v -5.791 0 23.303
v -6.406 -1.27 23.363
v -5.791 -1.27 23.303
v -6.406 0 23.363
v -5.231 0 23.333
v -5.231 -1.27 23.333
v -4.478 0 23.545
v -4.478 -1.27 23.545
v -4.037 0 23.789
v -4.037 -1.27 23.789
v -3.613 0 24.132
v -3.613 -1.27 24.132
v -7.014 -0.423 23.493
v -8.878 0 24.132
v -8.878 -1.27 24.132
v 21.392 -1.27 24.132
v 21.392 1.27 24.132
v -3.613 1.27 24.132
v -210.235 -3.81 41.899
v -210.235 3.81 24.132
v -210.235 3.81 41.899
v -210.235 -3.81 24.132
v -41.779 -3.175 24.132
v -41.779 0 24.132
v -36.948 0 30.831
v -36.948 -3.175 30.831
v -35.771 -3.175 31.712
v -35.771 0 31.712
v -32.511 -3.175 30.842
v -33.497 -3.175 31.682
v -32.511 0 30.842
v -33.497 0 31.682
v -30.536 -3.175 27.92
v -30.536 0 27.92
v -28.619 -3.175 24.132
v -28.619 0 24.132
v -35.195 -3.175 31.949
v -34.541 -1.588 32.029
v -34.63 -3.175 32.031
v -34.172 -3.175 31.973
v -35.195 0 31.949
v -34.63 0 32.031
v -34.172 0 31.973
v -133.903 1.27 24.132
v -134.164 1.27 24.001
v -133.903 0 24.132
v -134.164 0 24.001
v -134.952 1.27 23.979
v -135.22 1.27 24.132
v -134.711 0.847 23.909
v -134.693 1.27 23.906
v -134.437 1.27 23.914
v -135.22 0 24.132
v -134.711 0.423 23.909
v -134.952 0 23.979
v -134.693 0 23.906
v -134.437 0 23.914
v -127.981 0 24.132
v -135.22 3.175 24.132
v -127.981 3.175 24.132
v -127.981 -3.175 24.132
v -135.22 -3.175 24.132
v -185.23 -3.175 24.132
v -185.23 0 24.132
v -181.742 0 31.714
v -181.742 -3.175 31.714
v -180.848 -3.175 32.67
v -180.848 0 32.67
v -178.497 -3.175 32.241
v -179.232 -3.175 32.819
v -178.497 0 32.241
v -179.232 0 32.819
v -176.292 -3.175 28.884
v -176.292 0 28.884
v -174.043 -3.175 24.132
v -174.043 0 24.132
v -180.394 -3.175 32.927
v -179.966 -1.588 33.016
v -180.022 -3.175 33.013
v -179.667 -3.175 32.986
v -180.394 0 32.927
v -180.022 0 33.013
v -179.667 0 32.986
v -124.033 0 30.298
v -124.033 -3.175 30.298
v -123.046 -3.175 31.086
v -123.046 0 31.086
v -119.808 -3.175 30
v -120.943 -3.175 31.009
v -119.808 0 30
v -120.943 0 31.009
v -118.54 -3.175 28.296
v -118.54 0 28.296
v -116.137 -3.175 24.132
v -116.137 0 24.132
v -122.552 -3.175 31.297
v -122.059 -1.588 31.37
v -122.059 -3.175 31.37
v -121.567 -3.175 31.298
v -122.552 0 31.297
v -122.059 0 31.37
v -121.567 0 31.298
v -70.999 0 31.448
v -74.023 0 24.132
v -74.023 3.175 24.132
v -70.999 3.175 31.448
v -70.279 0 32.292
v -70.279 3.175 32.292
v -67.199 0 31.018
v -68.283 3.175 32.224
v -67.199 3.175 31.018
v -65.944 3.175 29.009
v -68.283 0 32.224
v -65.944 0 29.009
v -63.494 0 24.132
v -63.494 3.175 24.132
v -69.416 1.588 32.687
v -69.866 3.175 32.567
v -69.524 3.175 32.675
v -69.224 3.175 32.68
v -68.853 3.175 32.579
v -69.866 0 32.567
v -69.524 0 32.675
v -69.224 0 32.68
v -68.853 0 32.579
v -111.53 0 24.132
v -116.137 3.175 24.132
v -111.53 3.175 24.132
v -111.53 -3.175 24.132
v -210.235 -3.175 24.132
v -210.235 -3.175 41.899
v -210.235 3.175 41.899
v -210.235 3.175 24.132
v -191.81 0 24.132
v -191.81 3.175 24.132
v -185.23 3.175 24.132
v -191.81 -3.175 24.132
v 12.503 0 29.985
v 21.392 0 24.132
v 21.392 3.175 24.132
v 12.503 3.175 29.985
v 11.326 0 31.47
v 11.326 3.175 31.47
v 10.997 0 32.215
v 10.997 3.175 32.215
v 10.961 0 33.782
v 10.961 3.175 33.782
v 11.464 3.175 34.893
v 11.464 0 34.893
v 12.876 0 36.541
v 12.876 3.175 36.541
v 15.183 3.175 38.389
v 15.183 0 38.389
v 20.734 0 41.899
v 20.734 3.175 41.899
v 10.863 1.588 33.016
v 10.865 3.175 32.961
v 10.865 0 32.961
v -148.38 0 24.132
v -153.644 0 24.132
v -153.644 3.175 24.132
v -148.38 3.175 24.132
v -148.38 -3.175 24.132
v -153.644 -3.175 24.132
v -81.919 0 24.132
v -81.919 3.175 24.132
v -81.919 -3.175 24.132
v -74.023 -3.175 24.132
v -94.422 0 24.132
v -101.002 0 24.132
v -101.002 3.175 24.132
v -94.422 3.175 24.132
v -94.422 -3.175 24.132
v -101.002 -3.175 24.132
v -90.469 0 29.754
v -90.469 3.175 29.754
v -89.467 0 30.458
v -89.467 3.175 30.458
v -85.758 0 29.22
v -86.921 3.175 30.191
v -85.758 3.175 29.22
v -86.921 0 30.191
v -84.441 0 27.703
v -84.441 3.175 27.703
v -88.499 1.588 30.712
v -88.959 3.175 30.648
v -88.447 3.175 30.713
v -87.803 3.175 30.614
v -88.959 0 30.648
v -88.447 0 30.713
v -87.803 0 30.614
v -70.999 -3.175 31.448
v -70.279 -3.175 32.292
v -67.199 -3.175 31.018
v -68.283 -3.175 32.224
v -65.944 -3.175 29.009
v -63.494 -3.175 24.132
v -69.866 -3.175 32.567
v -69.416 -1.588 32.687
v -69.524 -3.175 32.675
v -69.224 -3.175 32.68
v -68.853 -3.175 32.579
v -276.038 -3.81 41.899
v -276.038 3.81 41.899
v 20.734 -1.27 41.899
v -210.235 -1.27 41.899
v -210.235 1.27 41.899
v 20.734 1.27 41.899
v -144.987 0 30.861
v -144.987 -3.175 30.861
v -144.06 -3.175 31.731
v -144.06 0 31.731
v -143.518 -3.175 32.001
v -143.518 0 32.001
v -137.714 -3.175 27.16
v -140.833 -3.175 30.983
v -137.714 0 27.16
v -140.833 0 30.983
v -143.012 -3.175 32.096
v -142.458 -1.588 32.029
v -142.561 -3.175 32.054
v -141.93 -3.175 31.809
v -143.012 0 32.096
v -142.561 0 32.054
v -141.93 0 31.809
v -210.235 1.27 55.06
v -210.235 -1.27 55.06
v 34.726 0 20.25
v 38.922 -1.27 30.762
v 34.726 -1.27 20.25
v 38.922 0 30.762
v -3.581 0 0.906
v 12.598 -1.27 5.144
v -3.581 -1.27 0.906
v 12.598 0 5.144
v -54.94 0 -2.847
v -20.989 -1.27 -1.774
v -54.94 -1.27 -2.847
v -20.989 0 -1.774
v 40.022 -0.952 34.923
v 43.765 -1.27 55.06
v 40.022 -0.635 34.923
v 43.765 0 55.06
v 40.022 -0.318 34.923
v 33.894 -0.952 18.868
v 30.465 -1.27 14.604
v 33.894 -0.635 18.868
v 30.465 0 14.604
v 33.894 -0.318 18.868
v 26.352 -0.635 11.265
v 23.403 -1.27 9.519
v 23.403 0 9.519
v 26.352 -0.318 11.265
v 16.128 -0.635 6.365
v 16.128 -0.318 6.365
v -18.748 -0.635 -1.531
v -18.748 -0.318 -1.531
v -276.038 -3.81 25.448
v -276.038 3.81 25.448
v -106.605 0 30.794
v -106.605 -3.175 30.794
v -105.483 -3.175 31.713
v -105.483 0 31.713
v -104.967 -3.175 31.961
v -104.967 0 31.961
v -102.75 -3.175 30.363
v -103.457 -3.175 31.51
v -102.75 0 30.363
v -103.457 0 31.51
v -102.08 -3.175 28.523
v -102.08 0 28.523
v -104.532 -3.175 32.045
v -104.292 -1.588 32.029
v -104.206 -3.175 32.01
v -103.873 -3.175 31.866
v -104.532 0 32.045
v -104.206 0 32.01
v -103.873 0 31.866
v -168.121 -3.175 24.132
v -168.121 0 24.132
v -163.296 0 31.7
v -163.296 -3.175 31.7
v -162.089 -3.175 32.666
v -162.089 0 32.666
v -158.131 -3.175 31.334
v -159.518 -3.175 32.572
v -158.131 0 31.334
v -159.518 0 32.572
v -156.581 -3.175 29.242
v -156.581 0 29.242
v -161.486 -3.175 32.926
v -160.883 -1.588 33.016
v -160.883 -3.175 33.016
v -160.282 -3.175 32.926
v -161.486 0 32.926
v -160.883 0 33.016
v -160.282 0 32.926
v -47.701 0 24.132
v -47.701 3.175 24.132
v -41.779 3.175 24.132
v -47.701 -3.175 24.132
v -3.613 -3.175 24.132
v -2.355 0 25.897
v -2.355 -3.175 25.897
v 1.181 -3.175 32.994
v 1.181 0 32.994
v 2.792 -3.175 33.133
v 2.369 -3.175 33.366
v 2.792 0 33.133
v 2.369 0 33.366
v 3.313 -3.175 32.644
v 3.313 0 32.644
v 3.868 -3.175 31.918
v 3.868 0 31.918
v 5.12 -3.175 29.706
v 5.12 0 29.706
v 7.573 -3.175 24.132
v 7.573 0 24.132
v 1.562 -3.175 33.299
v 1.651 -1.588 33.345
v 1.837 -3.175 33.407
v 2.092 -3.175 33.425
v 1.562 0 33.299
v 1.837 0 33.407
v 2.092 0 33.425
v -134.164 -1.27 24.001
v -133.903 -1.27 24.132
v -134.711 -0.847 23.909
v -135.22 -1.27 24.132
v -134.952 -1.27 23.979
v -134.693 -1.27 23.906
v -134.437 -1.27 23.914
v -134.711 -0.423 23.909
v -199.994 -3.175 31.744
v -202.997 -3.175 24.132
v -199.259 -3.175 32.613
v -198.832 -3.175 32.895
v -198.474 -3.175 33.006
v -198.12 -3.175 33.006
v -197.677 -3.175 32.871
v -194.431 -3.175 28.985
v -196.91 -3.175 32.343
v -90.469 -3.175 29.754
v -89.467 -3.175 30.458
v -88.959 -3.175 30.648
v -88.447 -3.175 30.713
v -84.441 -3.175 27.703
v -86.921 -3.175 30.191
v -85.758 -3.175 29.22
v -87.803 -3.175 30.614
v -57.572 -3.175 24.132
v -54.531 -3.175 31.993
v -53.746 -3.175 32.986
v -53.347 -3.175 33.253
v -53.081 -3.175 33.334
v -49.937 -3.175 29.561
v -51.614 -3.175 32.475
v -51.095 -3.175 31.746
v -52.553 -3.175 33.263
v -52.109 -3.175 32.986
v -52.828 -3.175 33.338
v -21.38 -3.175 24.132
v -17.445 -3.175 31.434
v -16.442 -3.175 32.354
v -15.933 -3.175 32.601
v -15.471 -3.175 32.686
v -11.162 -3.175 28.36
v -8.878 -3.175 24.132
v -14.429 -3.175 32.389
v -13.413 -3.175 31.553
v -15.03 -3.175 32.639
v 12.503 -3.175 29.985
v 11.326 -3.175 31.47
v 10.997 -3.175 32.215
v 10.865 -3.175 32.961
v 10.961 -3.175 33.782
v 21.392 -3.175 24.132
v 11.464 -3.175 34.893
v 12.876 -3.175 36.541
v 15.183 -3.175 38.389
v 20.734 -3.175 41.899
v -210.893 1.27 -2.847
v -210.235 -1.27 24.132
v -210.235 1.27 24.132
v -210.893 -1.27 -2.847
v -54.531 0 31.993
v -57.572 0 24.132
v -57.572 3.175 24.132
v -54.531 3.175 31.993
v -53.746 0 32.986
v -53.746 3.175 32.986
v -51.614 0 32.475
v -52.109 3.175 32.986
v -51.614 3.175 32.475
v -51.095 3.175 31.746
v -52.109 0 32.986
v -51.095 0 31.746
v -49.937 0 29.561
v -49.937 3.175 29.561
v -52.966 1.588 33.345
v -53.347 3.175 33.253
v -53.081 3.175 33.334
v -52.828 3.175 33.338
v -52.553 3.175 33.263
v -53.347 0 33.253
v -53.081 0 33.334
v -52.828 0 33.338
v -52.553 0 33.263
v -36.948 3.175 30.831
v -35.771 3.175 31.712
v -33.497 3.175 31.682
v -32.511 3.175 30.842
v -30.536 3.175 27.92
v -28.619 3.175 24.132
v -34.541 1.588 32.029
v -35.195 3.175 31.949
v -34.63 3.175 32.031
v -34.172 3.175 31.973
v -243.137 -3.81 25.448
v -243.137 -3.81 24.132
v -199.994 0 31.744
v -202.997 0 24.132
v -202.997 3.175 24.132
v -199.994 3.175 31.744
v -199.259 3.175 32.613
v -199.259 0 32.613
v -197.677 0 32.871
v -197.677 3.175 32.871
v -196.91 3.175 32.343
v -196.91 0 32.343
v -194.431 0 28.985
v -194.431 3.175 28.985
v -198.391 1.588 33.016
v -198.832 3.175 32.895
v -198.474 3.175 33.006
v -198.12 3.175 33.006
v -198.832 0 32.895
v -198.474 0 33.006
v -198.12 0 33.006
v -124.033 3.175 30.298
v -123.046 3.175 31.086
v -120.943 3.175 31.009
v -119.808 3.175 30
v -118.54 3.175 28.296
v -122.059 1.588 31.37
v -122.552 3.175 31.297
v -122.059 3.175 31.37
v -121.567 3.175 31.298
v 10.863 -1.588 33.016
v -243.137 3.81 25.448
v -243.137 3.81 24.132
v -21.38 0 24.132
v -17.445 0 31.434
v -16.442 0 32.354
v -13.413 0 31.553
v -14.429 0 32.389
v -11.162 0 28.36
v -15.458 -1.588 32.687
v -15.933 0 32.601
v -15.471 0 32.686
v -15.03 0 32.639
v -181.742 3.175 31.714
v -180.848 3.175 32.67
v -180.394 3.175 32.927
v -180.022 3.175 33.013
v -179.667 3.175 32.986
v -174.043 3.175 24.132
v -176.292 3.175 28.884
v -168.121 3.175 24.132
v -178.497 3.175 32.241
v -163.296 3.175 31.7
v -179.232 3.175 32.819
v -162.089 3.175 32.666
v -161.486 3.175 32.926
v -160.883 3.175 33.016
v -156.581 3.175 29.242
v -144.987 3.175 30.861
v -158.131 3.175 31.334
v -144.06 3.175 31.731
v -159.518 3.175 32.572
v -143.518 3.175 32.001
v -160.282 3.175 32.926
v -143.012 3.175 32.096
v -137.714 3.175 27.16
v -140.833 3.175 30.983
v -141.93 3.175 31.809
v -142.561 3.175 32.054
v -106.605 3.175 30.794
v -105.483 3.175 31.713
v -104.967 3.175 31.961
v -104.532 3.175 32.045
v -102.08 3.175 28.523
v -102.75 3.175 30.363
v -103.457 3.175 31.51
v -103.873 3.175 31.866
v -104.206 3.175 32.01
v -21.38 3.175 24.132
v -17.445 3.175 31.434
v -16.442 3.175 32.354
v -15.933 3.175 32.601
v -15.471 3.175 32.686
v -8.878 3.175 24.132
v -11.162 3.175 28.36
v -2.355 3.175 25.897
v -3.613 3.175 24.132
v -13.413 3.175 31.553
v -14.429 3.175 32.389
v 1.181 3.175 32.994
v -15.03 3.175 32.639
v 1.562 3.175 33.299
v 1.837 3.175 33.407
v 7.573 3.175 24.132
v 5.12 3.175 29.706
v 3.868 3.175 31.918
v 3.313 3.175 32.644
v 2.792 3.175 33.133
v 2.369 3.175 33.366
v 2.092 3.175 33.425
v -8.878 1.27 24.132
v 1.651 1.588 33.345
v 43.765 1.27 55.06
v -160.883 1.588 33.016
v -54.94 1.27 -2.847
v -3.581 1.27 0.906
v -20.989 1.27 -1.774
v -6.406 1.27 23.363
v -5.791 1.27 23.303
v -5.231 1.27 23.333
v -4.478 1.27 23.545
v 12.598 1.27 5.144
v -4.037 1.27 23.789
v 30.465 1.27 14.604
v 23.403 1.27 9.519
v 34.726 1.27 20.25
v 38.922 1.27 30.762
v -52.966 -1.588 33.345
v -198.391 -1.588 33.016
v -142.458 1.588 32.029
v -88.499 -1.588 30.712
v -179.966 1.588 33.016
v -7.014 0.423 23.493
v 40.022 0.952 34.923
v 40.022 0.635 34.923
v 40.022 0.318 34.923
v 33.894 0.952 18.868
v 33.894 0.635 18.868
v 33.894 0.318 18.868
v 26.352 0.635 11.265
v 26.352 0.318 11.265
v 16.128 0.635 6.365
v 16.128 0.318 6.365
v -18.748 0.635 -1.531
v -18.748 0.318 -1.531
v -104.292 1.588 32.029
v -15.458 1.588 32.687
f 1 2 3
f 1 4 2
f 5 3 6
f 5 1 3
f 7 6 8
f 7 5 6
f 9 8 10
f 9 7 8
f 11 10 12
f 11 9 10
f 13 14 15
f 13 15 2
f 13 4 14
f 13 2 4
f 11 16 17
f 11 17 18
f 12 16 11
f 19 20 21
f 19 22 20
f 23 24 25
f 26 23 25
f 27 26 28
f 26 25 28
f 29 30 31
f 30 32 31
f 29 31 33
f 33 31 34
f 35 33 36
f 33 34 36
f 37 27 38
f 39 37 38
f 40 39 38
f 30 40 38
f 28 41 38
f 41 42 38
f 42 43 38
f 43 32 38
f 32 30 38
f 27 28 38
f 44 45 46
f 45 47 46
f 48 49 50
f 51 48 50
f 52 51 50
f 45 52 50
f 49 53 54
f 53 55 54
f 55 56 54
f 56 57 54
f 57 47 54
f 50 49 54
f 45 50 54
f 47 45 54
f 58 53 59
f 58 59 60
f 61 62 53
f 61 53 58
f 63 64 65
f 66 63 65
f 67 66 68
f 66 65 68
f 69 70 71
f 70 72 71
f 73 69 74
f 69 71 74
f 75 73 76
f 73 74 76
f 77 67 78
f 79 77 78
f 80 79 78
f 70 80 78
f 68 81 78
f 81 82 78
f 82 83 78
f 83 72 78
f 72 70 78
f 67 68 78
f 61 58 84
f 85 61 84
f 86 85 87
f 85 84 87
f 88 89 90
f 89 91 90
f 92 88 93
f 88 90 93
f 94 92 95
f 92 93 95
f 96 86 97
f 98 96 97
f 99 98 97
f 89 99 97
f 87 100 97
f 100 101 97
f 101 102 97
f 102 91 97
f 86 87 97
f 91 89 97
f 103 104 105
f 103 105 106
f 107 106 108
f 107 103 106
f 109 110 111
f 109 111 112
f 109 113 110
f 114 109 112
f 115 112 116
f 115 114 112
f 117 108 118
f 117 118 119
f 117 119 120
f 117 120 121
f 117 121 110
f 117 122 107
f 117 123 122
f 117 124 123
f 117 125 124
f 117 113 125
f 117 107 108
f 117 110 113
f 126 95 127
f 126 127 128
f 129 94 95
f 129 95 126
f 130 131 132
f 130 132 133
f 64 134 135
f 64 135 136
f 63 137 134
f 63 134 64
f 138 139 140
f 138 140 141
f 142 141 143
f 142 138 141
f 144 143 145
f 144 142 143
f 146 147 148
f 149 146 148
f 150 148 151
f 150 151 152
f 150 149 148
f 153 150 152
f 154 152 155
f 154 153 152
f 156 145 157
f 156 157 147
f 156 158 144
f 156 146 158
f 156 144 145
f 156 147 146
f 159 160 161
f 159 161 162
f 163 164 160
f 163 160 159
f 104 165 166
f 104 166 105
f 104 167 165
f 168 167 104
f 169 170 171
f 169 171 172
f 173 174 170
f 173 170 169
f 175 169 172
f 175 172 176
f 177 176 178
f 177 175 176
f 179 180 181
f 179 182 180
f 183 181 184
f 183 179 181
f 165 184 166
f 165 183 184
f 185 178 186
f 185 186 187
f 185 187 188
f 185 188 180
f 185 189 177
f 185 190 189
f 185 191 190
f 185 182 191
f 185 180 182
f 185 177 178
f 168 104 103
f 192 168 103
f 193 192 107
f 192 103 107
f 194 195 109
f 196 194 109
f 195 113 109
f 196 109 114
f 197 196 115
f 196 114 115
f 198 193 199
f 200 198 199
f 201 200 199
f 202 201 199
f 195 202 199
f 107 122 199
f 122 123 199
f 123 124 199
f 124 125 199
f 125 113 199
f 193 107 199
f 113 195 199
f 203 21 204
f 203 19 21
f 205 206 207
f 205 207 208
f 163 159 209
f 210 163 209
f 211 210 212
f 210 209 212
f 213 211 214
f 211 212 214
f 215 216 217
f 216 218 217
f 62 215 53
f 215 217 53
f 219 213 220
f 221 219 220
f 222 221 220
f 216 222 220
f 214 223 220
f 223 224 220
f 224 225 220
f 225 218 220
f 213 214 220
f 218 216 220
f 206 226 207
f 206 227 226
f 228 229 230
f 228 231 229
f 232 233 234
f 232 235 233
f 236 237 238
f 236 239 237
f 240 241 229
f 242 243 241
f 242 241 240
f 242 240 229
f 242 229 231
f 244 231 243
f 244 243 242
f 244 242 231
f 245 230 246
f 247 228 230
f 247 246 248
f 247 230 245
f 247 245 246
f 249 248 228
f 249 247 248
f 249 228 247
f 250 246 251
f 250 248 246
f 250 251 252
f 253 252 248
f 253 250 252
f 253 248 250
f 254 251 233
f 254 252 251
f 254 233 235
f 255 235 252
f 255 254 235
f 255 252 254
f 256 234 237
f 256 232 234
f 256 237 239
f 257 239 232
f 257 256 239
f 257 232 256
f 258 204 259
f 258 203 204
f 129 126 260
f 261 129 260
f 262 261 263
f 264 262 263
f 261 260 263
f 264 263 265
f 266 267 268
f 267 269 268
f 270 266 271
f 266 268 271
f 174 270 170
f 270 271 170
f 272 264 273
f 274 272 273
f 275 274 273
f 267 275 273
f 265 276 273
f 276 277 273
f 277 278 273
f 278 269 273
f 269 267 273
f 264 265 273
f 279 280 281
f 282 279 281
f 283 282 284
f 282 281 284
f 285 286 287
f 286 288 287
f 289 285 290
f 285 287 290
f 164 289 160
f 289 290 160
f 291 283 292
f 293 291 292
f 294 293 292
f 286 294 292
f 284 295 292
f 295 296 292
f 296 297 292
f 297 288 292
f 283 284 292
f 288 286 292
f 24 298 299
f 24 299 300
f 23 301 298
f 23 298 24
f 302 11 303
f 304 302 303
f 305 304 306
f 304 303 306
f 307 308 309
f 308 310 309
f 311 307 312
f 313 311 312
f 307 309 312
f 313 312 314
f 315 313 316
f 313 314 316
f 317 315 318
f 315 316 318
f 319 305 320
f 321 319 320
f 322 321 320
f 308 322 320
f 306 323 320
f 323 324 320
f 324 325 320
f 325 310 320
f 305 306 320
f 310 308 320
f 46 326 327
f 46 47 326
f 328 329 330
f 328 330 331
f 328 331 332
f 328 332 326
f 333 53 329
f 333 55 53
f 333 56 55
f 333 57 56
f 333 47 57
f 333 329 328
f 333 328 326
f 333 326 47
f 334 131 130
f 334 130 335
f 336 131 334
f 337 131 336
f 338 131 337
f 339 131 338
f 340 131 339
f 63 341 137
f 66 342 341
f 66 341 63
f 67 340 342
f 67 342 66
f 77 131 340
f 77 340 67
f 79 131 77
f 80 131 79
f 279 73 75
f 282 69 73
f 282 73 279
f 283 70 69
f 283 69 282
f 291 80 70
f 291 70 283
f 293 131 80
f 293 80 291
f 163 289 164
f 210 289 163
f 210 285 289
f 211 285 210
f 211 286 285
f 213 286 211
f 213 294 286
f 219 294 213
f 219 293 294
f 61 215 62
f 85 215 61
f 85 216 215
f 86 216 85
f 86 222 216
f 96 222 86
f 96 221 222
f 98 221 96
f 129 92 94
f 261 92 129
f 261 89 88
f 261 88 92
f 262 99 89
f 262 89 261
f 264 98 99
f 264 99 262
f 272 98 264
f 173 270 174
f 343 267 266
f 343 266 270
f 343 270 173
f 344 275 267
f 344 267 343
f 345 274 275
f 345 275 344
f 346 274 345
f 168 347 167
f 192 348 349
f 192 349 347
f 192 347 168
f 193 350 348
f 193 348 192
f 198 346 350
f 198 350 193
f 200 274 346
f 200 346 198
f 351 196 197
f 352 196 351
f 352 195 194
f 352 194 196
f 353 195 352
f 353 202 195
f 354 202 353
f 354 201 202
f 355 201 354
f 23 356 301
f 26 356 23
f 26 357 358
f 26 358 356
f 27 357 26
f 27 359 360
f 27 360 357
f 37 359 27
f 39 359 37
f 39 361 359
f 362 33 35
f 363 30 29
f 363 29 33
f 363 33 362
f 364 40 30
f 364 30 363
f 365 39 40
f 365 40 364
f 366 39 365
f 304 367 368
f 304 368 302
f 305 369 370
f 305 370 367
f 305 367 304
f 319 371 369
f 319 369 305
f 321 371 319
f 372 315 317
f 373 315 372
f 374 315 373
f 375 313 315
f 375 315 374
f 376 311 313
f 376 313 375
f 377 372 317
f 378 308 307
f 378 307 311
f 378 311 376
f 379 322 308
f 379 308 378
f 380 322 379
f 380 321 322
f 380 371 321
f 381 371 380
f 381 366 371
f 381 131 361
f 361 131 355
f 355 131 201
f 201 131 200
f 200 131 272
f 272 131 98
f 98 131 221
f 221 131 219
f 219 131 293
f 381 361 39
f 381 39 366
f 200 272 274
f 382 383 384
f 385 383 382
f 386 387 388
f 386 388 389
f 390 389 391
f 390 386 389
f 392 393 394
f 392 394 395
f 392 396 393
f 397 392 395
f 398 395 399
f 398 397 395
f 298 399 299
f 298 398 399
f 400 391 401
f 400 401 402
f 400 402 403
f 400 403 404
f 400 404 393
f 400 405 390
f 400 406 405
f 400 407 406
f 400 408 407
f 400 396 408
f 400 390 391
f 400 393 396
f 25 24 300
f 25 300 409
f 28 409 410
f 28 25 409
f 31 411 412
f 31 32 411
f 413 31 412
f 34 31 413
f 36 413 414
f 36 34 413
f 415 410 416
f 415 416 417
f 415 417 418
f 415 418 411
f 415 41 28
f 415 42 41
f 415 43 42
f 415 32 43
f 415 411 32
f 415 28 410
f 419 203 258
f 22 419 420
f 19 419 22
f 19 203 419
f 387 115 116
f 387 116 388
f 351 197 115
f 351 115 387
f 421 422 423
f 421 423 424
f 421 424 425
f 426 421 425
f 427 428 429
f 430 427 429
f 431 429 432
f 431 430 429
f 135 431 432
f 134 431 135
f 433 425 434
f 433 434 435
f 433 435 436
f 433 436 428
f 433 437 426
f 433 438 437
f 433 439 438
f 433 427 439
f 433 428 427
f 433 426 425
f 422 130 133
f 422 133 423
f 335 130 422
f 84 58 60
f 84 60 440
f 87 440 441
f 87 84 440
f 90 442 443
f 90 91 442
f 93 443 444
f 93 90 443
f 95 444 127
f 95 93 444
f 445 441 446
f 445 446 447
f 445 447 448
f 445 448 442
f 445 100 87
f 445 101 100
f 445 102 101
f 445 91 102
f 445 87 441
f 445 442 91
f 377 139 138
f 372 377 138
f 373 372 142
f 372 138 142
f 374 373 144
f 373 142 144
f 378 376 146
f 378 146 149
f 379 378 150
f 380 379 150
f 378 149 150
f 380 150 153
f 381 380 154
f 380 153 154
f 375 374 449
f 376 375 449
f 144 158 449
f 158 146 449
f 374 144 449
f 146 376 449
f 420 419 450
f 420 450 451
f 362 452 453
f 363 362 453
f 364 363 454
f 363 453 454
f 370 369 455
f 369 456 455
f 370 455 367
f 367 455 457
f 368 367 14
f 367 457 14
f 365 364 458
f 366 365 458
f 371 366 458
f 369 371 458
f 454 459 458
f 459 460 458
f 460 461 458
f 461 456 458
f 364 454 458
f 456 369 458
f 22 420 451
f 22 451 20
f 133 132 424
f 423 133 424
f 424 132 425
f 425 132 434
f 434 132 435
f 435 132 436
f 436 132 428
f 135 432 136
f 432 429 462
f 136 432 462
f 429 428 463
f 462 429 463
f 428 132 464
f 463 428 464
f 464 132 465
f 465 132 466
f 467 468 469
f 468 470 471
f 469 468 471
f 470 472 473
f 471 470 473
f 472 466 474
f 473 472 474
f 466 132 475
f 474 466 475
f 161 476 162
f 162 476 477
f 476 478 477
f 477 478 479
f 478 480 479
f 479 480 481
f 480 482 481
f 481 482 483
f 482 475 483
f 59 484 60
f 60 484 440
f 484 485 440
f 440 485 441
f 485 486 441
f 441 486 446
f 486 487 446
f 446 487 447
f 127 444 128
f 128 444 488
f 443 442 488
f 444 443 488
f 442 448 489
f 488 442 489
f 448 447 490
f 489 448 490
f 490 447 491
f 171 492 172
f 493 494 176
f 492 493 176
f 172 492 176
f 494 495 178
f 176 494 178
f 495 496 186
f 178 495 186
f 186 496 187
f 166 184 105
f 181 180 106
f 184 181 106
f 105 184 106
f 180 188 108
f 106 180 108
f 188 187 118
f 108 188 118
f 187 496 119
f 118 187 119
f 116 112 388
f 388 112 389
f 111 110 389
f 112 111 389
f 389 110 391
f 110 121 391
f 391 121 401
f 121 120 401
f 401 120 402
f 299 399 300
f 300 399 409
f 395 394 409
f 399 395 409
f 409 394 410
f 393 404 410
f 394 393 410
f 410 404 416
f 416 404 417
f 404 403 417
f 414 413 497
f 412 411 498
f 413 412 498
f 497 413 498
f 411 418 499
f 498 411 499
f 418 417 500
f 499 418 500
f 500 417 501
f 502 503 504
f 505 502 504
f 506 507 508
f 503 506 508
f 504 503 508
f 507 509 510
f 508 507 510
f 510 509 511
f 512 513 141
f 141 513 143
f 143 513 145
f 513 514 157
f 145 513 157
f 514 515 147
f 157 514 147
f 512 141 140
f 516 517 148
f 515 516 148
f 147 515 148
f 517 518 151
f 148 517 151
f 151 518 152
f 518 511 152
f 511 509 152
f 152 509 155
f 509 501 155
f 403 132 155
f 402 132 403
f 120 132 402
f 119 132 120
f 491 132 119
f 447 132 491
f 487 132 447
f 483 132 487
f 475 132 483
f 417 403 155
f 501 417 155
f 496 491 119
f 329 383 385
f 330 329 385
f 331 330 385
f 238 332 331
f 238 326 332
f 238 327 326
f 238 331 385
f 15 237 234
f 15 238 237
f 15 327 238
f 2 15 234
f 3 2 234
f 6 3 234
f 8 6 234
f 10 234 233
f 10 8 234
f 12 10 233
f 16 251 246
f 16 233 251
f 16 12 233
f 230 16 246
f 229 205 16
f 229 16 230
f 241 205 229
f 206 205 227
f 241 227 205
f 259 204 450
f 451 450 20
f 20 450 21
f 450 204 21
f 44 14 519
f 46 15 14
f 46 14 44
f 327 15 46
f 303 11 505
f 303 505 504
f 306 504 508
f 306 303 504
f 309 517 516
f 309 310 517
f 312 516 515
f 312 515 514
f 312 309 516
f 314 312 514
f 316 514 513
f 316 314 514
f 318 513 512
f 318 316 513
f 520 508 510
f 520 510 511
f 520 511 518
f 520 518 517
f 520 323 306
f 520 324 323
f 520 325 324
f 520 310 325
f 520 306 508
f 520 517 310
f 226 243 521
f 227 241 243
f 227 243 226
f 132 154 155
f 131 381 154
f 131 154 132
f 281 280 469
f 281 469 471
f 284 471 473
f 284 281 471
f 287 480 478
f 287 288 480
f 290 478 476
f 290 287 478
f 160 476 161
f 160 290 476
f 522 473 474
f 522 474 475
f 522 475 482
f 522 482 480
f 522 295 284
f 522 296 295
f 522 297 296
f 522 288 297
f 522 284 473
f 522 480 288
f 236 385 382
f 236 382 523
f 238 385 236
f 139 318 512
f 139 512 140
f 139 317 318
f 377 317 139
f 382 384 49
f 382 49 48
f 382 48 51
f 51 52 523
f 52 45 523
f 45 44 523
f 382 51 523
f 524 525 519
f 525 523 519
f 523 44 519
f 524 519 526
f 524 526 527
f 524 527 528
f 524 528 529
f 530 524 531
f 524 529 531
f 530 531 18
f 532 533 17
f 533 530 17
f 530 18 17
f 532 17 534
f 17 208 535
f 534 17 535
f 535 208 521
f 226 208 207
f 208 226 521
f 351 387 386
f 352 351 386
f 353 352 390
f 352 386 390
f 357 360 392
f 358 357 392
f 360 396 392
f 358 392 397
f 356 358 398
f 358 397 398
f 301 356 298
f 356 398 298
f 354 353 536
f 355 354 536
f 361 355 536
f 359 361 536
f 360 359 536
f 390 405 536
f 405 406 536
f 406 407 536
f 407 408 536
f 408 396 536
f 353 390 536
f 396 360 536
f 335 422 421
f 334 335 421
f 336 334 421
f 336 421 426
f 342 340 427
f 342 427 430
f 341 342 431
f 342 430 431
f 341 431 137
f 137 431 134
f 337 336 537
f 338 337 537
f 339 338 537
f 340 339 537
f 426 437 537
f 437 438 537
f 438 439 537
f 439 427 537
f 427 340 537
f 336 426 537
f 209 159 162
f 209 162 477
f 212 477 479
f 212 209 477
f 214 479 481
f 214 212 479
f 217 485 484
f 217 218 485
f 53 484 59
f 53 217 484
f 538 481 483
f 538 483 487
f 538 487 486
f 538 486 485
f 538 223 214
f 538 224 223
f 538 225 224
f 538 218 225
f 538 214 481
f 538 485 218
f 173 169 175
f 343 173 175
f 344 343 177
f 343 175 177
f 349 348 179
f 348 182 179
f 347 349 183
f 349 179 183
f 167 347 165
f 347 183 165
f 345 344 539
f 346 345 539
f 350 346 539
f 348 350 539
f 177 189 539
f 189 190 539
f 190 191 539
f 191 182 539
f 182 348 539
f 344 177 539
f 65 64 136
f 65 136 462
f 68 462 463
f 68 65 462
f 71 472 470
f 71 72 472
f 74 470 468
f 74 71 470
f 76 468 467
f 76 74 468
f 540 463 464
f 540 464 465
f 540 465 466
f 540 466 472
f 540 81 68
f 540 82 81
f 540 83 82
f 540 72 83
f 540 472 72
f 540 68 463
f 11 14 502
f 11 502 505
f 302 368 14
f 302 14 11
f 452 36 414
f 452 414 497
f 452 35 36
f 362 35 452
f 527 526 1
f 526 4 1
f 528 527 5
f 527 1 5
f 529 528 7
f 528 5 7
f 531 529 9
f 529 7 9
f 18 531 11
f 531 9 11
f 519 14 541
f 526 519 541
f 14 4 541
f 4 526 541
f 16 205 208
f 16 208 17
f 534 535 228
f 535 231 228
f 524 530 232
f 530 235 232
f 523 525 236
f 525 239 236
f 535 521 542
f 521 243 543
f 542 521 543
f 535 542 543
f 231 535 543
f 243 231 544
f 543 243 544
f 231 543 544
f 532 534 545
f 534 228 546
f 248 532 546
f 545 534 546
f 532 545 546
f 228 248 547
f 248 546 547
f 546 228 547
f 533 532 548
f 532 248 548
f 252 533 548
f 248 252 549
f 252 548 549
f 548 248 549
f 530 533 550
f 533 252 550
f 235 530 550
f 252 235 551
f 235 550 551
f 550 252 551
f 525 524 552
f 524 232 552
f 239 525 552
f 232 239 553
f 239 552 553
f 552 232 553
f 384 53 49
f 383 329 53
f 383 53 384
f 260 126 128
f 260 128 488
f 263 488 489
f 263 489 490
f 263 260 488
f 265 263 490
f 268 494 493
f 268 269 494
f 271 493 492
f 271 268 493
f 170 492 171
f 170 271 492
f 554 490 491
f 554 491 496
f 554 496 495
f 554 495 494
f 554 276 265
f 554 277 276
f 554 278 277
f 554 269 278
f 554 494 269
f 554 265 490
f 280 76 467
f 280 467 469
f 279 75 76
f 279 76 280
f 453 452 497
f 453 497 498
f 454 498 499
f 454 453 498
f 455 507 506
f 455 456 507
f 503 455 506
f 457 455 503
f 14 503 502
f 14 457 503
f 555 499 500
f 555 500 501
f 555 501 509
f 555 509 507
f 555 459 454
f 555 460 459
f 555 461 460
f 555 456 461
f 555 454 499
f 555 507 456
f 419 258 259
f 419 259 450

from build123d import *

# Parameters (mm, degrees)
F1_DEPTH = 1.27
F2_DEPTH = 3.81
F3_DEPTH = 3.175


# Not quite as in the source:
# - the program builds the solid bodies; features that only make, move or delete a surface that nothing else refers to are left out


with BuildPart() as f1:
    # F0 (on Front) → F1 (new body, symmetric)
    with BuildSketch(Plane.XZ):
        with BuildLine():
            Line((-210.2350903421, 55.0596148509), (-210.2350903421, 41.8989928542))
            Line((-210.2350903421, 41.8989928542), (20.7338259748, 41.8989928542))
            Line((20.7338259748, 41.8989928542), (21.3918573496, 24.1321539834))
            Line((21.3918573496, 24.1321539834), (7.5731984796, 24.1321539834))
            Line((7.5731984796, 24.1321539834), (-3.6133266435, 24.1321539834))
            add(Edge.make_bspline(
                [(-8.8775776416, 24.1321539834), (-6.9998897347, 23.4129011572), (-5.1222018278, 22.693648331), (-3.6133266435, 24.1321539834)],
                knots=[0, 0, 0, 0, 0.2589285415, 0.2589285415, 0.2589285415, 0.2589285415], degree=3))
            Line((-8.8775776416, 24.1321539834), (-21.3801710128, 24.1321539834))
            Line((-21.3801710128, 24.1321539834), (-28.6185133859, 24.1321539834))
            Line((-28.6185133859, 24.1321539834), (-41.7791353826, 24.1321539834))
            Line((-41.7791353826, 24.1321539834), (-47.7014150062, 24.1321539834))
            Line((-47.7014150062, 24.1321539834), (-57.5718773798, 24.1321539834))
            Line((-57.5718773798, 24.1321539834), (-63.4941570034, 24.1321539834))
            Line((-63.4941570034, 24.1321539834), (-74.0226589996, 24.1321539834))
            Line((-74.0226589996, 24.1321539834), (-81.9190354967, 24.1321539834))
            Line((-81.9190354967, 24.1321539834), (-94.4216164963, 24.1321539834))
            Line((-94.4216164963, 24.1321539834), (-101.0019316185, 24.1321539834))
            Line((-101.0019316185, 24.1321539834), (-111.5304336147, 24.1321539834))
            Line((-111.5304336147, 24.1321539834), (-116.1366559872, 24.1321539834))
            Line((-116.1366559872, 24.1321539834), (-127.9812152344, 24.1321539834))
            Line((-127.9812152344, 24.1321539834), (-133.903483861, 24.1321539834))
            add(Edge.make_bspline(
                [(-135.219563106, 24.1321539834), (-134.6550824726, 23.7299911861), (-134.2792831668, 23.9310725847), (-133.903483861, 24.1321539834)],
                knots=[0.8482904011, 0.8482904011, 0.8482904011, 0.8482904011, 1, 1, 1, 1], degree=3))
            Line((-135.219563106, 24.1321539834), (-148.3801796042, 24.1321539834))
            Line((-148.3801796042, 24.1321539834), (-153.6444306023, 24.1321539834))
            Line((-153.6444306023, 24.1321539834), (-168.1211043515, 24.1321539834))
            Line((-168.1211043515, 24.1321539834), (-174.0433949721, 24.1321539834))
            Line((-174.0433949721, 24.1321539834), (-185.2299145968, 24.1321539834))
            Line((-185.2299145968, 24.1321539834), (-191.8102228459, 24.1321539834))
            Line((-191.8102228459, 24.1321539834), (-202.9967644645, 24.1321539834))
            Line((-202.9967644645, 24.1321539834), (-210.2350903421, 24.1321539834))
            Line((-210.2350903421, 24.1321539834), (-210.8931299646, -2.8471227594))
            Line((-210.8931299646, -2.8471227594), (-54.9397518808, -2.8471227594))
            add(Edge.make_bspline(
                [(43.7649096579, 55.0596148509), (41.5344704617, 41.1814325972), (37.606662647, 16.7419263316), (16.1763288382, 4.9896597977), (-19.2697295543, -3.0062101287), (-43.0245937063, -2.9002640541), (-54.9397518808, -2.8471227594)],
                knots=[0, 0, 0, 0, 0.2688261018, 0.4734032944, 0.7358653369, 1, 1, 1, 1], degree=3))
            Line((43.7649096579, 55.0596148509), (-210.2350903421, 55.0596148509))
        make_face()
    extrude(amount=F1_DEPTH, both=True)


with BuildPart() as f2:
    # F0 (on Front) → F2 (new body, symmetric)
    with BuildSketch(Plane.XZ):
        Polygon((-259.5874352014, 41.8989928542), (-276.0382168211, 41.8989928542), (-276.0382168211, 25.4482167329), (-270.1159262005, 25.4482167329), align=None)
        Polygon((-250.3750014533, 41.8989928542), (-259.5874352014, 41.8989928542), (-270.1159262005, 25.4482167329), (-259.5874352014, 25.4482167329), align=None)
        Polygon((-243.1366535816, 41.8989928542), (-250.3750014533, 41.8989928542), (-259.5874352014, 25.4482167329), (-243.1366535816, 25.4482167329), align=None)
        Polygon((-226.6858719619, 41.8989928542), (-243.1366535816, 41.8989928542), (-243.1366535816, 25.4482167329), align=None)
        Polygon((-226.6858719619, 41.8989928542), (-243.1366535816, 25.4482167329), (-243.1366535816, 24.1321539834), (-233.266191208, 24.1321539834), (-218.7894954648, 41.8989928542), align=None)
        Polygon((-210.2350903421, 41.8989928542), (-218.7894954648, 41.8989928542), (-233.266191208, 24.1321539834), (-220.7635923383, 24.1321539834), (-210.2350903421, 33.0155734188), align=None)
        Polygon((-210.2350903421, 33.0155734188), (-220.7635923383, 24.1321539834), (-210.2350903421, 24.1321539834), align=None)
    extrude(amount=F2_DEPTH, both=True)


with BuildPart() as f3:
    # F0 (on Front) → F3 (new body, symmetric)
    with BuildSketch(Plane.XZ):
        with BuildLine():
            Line((20.7338259748, 41.8989928542), (-210.2350903421, 41.8989928542))
            Line((-210.2350903421, 41.8989928542), (-210.2350903421, 33.0155734188))
            Line((-210.2350903421, 33.0155734188), (-210.2350903421, 24.1321539834))
            Line((-210.2350903421, 24.1321539834), (-202.9967644645, 24.1321539834))
            add(Edge.make_bspline(
                [(-202.9967644645, 24.1321539834), (-201.5957848409, 28.5019031742), (-198.7222548422, 37.4646355189), (-194.1521756938, 28.6495004192), (-191.8102228459, 24.1321539834)],
                knots=[0, 0, 0, 0, 0.4875465453, 1, 1, 1, 1], degree=3))
            Line((-191.8102228459, 24.1321539834), (-185.2299145968, 24.1321539834))
            add(Edge.make_bspline(
                [(-185.2299145968, 24.1321539834), (-183.5214416822, 28.5493597006), (-180.0757441181, 37.4581078877), (-176.0653326357, 28.5987800772), (-174.0433949721, 24.1321539834)],
                knots=[0, 0, 0, 0, 0.4958278789, 1, 1, 1, 1], degree=3))
            Line((-174.0433949721, 24.1321539834), (-168.1211043515, 24.1321539834))
            add(Edge.make_bspline(
                [(-168.1211043515, 24.1321539834), (-165.7083305261, 28.5738628036), (-160.8827814128, 37.4572831365), (-156.0572146933, 28.5738645986), (-153.6444306023, 24.1321539834)],
                knots=[0, 0, 0, 0, 0.4999998484, 1, 1, 1, 1], degree=3))
            Line((-153.6444306023, 24.1321539834), (-148.3801796042, 24.1321539834))
            add(Edge.make_bspline(
                [(-148.3801796042, 24.1321539834), (-146.6101632269, 28.4123234005), (-142.9962239159, 37.1513795538), (-136.8299953213, 25.2795023356), (-135.219563106, 24.1321539834)],
                knots=[0, 0, 0, 0, 0.4154712555, 0.8482904011, 0.8482904011, 0.8482904011, 0.8482904011], degree=3))
            Line((-135.219563106, 24.1321539834), (-133.903483861, 24.1321539834))
            Line((-133.903483861, 24.1321539834), (-127.9812152344, 24.1321539834))
            add(Edge.make_bspline(
                [(-127.9812152344, 24.1321539834), (-126.0071220265, 27.75132517), (-122.0589356108, 34.9896675431), (-118.1107491951, 27.75132517), (-116.1366559872, 24.1321539834)],
                knots=[0, 0, 0, 0, 0.5, 1, 1, 1, 1], degree=3))
            Line((-116.1366559872, 24.1321539834), (-111.5304336147, 24.1321539834))
            add(Edge.make_bspline(
                [(-111.5304336147, 24.1321539834), (-108.8046270355, 28.2369832553), (-103.642943259, 36.0100331921), (-101.848674416, 27.9403570656), (-101.0019316185, 24.1321539834)],
                knots=[0, 0, 0, 0, 0.5280847679, 1, 1, 1, 1], degree=3))
            Line((-101.0019316185, 24.1321539834), (-94.4216164963, 24.1321539834))
            add(Edge.make_bspline(
                [(-94.4216164963, 24.1321539834), (-92.488331209, 27.3952792744), (-88.5729079881, 34.0039865465), (-84.1553655194, 27.4500227235), (-81.9190354967, 24.1321539834)],
                knots=[0, 0, 0, 0, 0.4937615114, 1, 1, 1, 1], degree=3))
            Line((-81.9190354967, 24.1321539834), (-74.0226589996, 24.1321539834))
            add(Edge.make_bspline(
                [(-74.0226589996, 24.1321539834), (-72.5787170502, 28.3613624742), (-69.6405343905, 36.967101131), (-65.5661989873, 28.4590196598), (-63.4941570034, 24.1321539834)],
                knots=[0, 0, 0, 0, 0.491440498, 1, 1, 1, 1], degree=3))
            Line((-63.4941570034, 24.1321539834), (-57.5718773798, 24.1321539834))
            add(Edge.make_bspline(
                [(-57.5718773798, 24.1321539834), (-56.084481964, 28.7157307739), (-53.0874293735, 37.9514864762), (-49.5056215462, 28.7613525636), (-47.7014150062, 24.1321539834)],
                knots=[0, 0, 0, 0, 0.496286058, 1, 1, 1, 1], degree=3))
            Line((-47.7014150062, 24.1321539834), (-41.7791353826, 24.1321539834))
            add(Edge.make_bspline(
                [(-41.7791353826, 24.1321539834), (-39.275468623, 28.135292461), (-34.3684870064, 35.9811157289), (-30.5088603888, 28.0275891282), (-28.6185133859, 24.1321539834)],
                knots=[0, 0, 0, 0, 0.5102254207, 1, 1, 1, 1], degree=3))
            Line((-28.6185133859, 24.1321539834), (-21.3801710128, 24.1321539834))
            add(Edge.make_bspline(
                [(-21.3801710128, 24.1321539834), (-19.4505524478, 28.3834837385), (-15.5556532425, 36.9647138246), (-11.1171492996, 28.4357047423), (-8.8775776416, 24.1321539834)],
                knots=[0, 0, 0, 0, 0.4954219514, 1, 1, 1, 1], degree=3))
            Line((-8.8775776416, 24.1321539834), (-3.6133266435, 24.1321539834))
            add(Edge.make_bspline(
                [(-3.6133266435, 24.1321539834), (-1.4711683739, 26.1744082476), (1.3487420826, 39.0591214669), (5.4874578129, 29.1340017152), (7.5731984796, 24.1321539834)],
                knots=[0.2589285415, 0.2589285415, 0.2589285415, 0.2589285415, 0.6265307939, 1, 1, 1, 1], degree=3))
            Line((7.5731984796, 24.1321539834), (21.3918573496, 24.1321539834))
            add(Edge.make_bspline(
                [(21.3918573496, 24.1321539834), (16.151488001, 27.0794656184), (5.7659846892, 32.9205261829), (15.7751403015, 38.9245229088), (20.7338259748, 41.8989928542)],
                knots=[0, 0, 0, 0, 0.5045850154, 1, 1, 1, 1], degree=3))
        make_face()
    extrude(amount=F3_DEPTH, both=True)


solid = Compound([f1.part, f2.part, f3.part])
